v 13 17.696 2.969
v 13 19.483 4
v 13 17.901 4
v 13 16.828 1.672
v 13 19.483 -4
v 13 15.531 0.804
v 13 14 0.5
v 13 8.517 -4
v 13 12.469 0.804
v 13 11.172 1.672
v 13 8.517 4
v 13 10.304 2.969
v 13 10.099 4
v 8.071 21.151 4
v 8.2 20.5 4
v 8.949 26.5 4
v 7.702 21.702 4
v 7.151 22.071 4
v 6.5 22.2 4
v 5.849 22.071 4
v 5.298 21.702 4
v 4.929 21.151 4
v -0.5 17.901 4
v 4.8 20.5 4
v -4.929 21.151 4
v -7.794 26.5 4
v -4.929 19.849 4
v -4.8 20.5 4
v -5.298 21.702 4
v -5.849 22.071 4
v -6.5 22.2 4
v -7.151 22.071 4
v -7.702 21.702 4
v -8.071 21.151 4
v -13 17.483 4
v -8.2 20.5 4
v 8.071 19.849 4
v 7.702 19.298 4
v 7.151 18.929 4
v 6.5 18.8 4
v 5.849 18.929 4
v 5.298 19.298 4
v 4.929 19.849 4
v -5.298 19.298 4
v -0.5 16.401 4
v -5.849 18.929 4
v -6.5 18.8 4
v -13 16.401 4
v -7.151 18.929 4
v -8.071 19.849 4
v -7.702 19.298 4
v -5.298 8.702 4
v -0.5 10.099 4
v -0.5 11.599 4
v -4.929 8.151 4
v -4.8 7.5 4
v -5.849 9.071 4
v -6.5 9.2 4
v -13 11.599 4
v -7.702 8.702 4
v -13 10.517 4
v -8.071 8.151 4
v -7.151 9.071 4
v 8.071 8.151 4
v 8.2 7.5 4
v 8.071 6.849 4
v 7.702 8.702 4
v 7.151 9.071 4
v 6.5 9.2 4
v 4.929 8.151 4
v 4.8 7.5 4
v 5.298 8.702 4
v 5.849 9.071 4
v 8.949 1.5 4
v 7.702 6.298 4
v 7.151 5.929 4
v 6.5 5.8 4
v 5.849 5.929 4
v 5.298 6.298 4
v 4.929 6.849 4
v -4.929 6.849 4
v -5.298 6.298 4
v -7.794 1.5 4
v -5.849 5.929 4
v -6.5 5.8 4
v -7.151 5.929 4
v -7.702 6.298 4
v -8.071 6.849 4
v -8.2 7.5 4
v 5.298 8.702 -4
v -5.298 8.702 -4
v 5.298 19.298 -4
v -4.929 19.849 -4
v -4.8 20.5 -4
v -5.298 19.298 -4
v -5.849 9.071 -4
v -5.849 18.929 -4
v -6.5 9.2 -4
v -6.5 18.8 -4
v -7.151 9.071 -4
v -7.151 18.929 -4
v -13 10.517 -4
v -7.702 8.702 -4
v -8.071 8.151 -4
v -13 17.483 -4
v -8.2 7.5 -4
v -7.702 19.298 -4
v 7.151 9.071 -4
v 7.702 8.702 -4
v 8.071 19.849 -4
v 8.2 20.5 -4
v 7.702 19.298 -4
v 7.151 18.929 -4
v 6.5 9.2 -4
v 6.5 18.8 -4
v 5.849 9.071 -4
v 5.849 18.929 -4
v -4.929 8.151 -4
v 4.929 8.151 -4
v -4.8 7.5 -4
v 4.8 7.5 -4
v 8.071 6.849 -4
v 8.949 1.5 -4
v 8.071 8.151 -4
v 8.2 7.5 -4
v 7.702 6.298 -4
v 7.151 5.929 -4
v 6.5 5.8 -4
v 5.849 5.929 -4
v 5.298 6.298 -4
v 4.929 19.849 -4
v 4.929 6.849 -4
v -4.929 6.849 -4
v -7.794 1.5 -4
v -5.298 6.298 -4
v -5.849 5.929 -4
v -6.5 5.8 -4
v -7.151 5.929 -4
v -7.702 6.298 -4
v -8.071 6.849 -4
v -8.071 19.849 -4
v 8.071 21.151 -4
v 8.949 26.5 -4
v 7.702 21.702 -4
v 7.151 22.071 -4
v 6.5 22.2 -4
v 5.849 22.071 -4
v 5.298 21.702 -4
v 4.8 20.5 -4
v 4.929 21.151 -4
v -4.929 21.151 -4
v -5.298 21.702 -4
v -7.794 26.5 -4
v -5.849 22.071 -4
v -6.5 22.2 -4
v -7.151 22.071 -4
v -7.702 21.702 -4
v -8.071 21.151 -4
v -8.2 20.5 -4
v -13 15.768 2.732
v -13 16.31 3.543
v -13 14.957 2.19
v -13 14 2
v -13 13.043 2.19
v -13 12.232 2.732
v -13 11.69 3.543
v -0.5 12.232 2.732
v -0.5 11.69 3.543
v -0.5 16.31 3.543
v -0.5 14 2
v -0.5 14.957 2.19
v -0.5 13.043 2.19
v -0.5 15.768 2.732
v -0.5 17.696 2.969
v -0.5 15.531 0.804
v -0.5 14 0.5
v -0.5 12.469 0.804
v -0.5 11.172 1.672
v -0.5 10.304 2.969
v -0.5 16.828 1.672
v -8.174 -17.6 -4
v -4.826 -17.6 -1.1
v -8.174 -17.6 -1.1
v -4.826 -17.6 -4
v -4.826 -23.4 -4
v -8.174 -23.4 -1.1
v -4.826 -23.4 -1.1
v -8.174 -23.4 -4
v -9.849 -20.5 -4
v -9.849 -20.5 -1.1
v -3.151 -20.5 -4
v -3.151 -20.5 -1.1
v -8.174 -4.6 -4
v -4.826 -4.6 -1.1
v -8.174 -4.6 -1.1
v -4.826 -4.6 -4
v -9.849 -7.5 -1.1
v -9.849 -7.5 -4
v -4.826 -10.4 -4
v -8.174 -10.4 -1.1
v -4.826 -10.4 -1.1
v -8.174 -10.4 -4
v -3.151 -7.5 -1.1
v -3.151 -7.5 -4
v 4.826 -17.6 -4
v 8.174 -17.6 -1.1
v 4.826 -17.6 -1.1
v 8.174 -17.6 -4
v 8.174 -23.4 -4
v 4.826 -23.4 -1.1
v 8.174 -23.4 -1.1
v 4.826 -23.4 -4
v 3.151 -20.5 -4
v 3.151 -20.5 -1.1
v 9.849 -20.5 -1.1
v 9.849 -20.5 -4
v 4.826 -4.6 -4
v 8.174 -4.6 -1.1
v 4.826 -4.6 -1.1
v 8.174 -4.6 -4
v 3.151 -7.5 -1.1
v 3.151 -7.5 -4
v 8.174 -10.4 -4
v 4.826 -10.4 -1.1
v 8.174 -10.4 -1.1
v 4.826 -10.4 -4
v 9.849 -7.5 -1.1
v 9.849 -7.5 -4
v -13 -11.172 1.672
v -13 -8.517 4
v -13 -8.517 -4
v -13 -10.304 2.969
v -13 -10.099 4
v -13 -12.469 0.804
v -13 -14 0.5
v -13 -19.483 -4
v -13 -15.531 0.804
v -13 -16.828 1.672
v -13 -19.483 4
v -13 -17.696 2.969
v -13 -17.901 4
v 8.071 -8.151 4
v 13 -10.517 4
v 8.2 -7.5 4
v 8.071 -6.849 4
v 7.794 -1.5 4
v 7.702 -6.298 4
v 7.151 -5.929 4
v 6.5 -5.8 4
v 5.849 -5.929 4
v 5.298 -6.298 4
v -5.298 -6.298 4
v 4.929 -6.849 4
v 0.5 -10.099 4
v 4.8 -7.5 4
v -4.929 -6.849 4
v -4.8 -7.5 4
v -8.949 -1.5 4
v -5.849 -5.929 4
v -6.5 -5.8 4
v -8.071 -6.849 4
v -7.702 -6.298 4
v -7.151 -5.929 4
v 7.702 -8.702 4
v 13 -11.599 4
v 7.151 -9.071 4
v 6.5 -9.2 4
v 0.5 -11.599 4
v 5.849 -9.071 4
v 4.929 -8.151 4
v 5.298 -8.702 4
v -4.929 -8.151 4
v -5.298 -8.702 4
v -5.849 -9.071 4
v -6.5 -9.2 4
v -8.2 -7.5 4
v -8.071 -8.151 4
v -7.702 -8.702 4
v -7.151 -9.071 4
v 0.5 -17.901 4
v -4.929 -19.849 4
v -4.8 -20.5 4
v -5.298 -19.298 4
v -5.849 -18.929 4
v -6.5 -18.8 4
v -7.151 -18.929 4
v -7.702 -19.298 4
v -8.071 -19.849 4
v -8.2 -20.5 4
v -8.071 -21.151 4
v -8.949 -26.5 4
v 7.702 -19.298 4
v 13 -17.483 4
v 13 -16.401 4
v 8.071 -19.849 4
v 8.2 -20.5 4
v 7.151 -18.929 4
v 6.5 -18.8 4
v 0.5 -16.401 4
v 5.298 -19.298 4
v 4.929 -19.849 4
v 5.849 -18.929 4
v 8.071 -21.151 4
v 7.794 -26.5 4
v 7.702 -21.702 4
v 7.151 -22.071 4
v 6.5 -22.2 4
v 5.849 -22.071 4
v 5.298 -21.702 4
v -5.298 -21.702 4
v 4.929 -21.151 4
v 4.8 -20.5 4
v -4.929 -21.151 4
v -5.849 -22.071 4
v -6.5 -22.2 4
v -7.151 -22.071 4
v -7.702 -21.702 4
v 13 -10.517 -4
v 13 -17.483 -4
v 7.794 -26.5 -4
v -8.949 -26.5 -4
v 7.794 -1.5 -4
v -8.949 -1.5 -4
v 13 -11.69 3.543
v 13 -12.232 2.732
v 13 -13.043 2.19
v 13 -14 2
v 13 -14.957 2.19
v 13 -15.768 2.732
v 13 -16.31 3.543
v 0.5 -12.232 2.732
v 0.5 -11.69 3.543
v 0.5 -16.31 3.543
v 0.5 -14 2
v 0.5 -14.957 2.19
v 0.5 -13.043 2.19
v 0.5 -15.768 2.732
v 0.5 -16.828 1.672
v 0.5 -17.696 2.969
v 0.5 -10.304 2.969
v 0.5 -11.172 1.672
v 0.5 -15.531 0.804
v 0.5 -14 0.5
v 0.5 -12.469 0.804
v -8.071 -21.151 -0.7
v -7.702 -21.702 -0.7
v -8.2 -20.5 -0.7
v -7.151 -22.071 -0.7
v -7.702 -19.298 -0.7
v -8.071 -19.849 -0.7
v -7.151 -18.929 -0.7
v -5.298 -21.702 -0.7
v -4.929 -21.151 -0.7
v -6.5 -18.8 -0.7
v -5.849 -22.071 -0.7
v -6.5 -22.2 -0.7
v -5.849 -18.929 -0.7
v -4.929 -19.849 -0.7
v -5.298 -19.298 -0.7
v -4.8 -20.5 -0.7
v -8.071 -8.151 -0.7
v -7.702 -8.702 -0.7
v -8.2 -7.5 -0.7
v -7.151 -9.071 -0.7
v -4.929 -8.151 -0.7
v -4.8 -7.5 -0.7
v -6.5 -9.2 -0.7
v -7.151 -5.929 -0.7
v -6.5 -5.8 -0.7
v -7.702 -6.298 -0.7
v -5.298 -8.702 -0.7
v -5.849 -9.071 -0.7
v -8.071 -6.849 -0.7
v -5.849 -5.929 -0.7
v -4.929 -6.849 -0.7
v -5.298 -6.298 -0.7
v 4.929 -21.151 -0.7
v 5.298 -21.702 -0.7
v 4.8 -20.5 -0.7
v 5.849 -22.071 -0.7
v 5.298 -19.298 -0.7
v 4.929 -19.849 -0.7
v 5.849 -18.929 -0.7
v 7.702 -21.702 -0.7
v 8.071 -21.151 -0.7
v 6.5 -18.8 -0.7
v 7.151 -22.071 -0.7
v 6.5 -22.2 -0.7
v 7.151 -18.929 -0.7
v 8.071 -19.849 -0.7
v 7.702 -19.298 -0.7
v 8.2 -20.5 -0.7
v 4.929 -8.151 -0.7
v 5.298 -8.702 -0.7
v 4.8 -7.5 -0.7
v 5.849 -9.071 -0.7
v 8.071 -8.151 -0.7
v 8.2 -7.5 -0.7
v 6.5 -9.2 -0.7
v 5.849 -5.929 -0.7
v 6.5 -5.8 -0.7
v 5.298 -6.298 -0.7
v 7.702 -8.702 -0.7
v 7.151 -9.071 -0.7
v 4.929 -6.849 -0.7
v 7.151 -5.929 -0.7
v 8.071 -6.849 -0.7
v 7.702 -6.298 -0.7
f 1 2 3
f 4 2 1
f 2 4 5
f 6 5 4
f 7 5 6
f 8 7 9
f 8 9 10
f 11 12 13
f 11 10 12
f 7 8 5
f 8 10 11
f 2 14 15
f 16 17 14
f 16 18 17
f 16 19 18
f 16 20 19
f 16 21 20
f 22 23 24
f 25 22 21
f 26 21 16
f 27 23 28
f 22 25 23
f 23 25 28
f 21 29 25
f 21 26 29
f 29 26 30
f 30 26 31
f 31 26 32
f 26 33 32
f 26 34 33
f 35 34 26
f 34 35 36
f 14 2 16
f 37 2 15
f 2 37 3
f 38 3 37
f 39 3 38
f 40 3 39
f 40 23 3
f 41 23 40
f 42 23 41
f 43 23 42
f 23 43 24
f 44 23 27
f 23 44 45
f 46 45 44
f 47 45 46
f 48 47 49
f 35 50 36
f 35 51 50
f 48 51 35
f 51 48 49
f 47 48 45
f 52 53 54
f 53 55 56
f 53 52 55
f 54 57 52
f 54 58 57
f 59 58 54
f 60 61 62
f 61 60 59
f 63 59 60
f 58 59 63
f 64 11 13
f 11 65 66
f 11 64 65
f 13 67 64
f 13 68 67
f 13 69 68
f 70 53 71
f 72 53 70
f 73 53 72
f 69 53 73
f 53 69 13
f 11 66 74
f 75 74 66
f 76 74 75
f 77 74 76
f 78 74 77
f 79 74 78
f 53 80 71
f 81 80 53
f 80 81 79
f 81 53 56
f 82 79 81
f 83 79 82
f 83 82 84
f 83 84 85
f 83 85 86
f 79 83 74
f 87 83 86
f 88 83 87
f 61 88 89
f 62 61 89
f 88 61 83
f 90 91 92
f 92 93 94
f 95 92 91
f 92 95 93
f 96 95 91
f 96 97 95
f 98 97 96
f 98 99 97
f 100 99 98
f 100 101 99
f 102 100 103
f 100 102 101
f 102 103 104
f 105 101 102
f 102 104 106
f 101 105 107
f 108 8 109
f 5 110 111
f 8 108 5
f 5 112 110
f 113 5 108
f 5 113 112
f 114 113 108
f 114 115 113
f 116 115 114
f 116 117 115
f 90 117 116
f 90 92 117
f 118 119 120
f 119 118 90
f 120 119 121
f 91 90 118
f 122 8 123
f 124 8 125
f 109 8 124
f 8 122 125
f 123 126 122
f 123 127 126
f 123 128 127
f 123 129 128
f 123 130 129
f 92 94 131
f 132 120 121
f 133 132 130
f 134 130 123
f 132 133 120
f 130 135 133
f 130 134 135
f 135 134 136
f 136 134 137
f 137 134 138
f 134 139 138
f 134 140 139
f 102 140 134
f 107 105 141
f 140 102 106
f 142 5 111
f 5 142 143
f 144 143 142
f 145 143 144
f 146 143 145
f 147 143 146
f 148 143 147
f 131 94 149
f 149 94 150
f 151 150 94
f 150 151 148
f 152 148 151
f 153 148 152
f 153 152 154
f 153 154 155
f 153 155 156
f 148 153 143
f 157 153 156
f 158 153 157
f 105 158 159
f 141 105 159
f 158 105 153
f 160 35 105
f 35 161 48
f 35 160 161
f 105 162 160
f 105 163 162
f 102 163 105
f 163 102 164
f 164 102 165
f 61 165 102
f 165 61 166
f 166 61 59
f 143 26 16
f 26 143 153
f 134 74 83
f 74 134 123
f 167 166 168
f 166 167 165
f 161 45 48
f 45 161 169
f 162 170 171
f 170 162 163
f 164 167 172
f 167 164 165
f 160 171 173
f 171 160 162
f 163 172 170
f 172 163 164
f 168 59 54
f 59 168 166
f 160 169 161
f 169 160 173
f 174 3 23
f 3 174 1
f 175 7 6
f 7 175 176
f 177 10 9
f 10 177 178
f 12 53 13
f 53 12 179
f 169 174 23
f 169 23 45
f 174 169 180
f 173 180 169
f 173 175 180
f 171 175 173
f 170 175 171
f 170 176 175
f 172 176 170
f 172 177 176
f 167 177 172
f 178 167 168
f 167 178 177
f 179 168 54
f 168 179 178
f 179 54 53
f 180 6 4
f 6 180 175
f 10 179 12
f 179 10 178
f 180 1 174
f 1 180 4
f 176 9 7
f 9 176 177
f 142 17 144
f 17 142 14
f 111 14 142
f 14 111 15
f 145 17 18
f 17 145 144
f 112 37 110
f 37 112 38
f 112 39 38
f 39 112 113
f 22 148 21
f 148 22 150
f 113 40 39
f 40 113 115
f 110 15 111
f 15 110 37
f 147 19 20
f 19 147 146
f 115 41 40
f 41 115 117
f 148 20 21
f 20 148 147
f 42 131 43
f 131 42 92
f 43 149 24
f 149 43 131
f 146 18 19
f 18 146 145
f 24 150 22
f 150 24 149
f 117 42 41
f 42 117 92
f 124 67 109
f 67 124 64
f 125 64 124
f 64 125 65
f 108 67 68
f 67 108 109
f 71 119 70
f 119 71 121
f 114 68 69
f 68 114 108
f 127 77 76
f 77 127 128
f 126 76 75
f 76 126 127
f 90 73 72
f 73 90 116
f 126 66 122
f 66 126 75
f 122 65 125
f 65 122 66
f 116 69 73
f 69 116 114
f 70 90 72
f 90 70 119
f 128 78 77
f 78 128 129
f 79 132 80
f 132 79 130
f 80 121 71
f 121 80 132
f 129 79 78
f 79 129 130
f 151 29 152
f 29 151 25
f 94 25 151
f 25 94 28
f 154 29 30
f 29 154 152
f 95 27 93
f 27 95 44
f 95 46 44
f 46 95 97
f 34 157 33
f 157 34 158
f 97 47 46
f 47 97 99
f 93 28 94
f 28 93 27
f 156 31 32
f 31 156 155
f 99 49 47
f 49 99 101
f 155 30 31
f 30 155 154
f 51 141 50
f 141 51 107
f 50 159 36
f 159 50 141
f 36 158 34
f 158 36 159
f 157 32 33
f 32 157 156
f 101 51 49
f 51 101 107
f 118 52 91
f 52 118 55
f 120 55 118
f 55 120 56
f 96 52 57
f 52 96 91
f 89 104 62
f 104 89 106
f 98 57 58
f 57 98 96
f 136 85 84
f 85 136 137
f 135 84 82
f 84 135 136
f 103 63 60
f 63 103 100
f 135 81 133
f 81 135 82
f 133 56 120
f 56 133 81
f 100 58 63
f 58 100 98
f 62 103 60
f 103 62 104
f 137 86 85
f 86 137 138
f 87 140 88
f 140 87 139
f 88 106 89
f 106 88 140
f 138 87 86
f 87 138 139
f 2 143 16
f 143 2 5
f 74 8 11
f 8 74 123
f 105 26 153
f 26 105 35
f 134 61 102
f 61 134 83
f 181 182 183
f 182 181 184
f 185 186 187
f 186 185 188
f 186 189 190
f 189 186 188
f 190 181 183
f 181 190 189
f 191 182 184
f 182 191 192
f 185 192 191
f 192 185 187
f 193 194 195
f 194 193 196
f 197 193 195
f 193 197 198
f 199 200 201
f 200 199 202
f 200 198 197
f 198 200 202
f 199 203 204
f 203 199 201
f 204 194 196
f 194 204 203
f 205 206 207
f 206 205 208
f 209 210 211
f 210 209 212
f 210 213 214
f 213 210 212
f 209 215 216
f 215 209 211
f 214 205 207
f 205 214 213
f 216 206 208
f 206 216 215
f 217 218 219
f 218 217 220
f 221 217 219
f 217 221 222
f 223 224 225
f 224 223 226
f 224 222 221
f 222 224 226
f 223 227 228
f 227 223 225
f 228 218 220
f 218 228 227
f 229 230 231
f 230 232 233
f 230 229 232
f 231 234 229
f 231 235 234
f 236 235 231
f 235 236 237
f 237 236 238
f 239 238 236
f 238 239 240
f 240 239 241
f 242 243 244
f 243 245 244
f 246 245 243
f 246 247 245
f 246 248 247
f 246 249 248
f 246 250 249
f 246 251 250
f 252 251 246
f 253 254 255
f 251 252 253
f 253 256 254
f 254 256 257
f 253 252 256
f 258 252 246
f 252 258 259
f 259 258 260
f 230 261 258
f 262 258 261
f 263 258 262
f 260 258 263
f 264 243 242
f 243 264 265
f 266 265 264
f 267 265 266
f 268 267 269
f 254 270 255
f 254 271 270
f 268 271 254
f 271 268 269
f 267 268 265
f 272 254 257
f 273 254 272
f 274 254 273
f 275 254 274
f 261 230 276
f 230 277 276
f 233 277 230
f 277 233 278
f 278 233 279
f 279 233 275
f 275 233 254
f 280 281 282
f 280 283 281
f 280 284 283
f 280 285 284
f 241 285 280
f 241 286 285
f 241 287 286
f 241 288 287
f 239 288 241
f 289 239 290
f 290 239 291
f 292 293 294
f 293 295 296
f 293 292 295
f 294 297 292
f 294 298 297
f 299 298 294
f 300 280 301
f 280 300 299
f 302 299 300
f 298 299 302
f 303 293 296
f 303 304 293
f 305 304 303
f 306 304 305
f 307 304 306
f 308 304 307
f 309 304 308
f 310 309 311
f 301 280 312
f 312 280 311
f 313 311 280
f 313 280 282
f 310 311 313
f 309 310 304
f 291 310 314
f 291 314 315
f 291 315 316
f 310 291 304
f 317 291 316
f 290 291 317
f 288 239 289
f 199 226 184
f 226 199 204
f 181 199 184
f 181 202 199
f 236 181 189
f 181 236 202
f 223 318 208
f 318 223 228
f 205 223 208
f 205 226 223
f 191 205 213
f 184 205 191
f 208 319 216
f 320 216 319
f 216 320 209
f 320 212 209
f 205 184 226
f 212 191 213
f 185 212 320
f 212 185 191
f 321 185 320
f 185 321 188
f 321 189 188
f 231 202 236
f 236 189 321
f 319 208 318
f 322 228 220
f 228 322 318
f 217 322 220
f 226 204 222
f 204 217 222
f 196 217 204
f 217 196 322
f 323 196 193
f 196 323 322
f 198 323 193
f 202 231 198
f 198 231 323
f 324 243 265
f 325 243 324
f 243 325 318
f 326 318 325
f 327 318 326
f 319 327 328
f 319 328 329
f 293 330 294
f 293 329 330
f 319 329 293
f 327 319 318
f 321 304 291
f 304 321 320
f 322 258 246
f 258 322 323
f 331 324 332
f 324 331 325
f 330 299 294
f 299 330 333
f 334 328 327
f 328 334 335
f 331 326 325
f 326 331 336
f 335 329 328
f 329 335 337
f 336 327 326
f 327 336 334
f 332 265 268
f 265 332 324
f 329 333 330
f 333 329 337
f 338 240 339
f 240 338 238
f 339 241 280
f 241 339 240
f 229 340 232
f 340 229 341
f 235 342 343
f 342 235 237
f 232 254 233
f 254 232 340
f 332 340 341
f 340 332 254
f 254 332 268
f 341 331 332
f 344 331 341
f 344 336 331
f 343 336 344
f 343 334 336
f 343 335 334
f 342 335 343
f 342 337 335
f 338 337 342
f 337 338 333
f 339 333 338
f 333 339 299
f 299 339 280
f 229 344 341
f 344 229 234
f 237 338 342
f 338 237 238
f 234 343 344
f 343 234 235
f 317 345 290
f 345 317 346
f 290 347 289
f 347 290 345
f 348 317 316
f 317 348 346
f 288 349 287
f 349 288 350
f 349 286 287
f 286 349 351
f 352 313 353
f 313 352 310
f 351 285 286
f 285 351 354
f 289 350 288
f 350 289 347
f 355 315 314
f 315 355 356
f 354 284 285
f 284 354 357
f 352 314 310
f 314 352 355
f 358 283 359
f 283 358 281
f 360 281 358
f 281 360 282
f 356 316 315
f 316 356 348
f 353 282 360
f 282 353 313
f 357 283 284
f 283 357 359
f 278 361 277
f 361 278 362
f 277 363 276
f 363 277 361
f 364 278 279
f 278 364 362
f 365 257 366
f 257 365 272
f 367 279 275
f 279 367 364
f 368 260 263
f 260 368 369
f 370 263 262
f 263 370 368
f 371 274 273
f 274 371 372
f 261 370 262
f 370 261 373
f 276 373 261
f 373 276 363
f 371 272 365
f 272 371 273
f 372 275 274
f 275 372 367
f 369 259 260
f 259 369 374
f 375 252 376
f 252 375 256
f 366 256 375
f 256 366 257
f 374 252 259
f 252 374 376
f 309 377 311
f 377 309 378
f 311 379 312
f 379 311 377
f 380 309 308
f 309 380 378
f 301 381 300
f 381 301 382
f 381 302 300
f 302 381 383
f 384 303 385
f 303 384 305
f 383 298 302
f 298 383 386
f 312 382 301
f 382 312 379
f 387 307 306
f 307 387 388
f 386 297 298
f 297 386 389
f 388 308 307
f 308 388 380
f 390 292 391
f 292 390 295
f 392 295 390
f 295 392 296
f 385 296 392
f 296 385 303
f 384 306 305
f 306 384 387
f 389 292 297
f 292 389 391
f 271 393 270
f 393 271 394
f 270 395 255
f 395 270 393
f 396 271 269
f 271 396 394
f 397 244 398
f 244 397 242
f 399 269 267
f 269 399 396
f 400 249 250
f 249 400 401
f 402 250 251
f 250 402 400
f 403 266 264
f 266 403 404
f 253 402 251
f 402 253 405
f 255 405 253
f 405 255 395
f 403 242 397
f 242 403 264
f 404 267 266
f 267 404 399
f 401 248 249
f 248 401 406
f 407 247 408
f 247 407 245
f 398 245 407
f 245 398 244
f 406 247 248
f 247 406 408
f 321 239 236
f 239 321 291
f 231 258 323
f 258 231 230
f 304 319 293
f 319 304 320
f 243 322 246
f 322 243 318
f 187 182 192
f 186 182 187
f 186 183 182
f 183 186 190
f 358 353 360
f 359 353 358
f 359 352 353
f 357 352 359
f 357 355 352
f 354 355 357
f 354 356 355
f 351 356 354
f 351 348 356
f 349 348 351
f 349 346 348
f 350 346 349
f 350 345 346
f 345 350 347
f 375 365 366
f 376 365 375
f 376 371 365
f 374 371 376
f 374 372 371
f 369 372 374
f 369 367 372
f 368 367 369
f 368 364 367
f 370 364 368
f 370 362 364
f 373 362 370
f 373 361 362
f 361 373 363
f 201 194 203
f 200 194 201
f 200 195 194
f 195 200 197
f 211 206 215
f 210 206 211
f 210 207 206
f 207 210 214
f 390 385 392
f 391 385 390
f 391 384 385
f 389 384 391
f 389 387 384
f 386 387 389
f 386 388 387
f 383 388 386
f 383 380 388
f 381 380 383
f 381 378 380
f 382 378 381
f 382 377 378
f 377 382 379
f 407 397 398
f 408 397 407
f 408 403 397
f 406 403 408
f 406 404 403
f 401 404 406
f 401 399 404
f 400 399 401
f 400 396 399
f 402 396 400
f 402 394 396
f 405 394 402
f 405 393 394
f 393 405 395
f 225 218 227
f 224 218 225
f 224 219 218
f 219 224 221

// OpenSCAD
holeX = 6.5;
holeY = 6.5;

holeR = 3.4 / 2;
nutR = 5.8/sqrt(3);
//nutR=3.25;
nutH = 3;
corner_cut = 24;

studding_dia = 5.0;
shaft_dia = 8.0;

module coupling(c){
    union(){
        difference(){
            cube(size = [26,25,8], center = true);

            if(c==1){
                //slot
            	*cube(size = [2,40,30], center = true);
                
                //nut holes
            	translate([ holeX,  holeY, nutH/2 - 4.01]) cylinder(h = nutH, r=nutR, $fn=6, center=true);
            	translate([ holeX, -holeY, nutH/2 - 4.01]) cylinder(h = nutH, r=nutR, $fn=6, center=true);
            	translate([-holeX,  holeY, nutH/2 - 4.01]) cylinder(h = nutH, r=nutR, $fn=6, center=true);
            	translate([-holeX, -holeY, nutH/2 - 4.01]) cylinder(h = nutH, r=nutR, $fn=6, center=true);
            }

            //shaft groves
            translate([ -16, 0, 4.5]) rotate([0,90,0]) cylinder(h = 16, r=studding_dia / 2, $fn=16);
            translate([-0.5, 0, 4.5]) rotate([0,90,0]) cylinder(h = 16, r=shaft_dia / 2,    $fn=16);

            //screw holes
            translate([ holeX,  holeY, -10]) cylinder(h = 20, r=holeR, $fn=16);
            translate([ holeX, -holeY, -10]) cylinder(h = 20, r=holeR, $fn=16);
            translate([-holeX,  holeY, -10]) cylinder(h = 20, r=holeR, $fn=16);
            translate([-holeX, -holeY, -10]) cylinder(h = 20, r=holeR, $fn=16);

            //corners
            rotate([0,0,30])   translate([corner_cut, 0, 0]) cube(size = [20,40,20], center = true);
            rotate([0,0,-30])  translate([corner_cut, 0, 0]) cube(size = [20,40,20], center = true);
            rotate([0,0,150])  translate([corner_cut-1, 0, 0]) cube(size = [20,40,20], center = true);
            rotate([0,0,-150]) translate([corner_cut-1, 0, 0]) cube(size = [20,40,20], center = true);
        }
        if(c==1){
            // bridge
        	translate([ holeX,  holeY, nutH-3.9]) cylinder(h = 0.4, r=nutR+0.1, $fn=6, center=true);
        	translate([ holeX, -holeY, nutH-3.9]) cylinder(h = 0.4, r=nutR+0.1, $fn=6, center=true);
        	translate([-holeX,  holeY, nutH-3.9]) cylinder(h = 0.4, r=nutR+0.1, $fn=6, center=true);
        	translate([-holeX, -holeY, nutH-3.9]) cylinder(h = 0.4, r=nutR+0.1, $fn=6, center=true);
        }
    }
}

translate([0, 14, 0]) coupling(c=0);
translate([0, -14, 0]) rotate([0,0,180]) coupling(c=1);
